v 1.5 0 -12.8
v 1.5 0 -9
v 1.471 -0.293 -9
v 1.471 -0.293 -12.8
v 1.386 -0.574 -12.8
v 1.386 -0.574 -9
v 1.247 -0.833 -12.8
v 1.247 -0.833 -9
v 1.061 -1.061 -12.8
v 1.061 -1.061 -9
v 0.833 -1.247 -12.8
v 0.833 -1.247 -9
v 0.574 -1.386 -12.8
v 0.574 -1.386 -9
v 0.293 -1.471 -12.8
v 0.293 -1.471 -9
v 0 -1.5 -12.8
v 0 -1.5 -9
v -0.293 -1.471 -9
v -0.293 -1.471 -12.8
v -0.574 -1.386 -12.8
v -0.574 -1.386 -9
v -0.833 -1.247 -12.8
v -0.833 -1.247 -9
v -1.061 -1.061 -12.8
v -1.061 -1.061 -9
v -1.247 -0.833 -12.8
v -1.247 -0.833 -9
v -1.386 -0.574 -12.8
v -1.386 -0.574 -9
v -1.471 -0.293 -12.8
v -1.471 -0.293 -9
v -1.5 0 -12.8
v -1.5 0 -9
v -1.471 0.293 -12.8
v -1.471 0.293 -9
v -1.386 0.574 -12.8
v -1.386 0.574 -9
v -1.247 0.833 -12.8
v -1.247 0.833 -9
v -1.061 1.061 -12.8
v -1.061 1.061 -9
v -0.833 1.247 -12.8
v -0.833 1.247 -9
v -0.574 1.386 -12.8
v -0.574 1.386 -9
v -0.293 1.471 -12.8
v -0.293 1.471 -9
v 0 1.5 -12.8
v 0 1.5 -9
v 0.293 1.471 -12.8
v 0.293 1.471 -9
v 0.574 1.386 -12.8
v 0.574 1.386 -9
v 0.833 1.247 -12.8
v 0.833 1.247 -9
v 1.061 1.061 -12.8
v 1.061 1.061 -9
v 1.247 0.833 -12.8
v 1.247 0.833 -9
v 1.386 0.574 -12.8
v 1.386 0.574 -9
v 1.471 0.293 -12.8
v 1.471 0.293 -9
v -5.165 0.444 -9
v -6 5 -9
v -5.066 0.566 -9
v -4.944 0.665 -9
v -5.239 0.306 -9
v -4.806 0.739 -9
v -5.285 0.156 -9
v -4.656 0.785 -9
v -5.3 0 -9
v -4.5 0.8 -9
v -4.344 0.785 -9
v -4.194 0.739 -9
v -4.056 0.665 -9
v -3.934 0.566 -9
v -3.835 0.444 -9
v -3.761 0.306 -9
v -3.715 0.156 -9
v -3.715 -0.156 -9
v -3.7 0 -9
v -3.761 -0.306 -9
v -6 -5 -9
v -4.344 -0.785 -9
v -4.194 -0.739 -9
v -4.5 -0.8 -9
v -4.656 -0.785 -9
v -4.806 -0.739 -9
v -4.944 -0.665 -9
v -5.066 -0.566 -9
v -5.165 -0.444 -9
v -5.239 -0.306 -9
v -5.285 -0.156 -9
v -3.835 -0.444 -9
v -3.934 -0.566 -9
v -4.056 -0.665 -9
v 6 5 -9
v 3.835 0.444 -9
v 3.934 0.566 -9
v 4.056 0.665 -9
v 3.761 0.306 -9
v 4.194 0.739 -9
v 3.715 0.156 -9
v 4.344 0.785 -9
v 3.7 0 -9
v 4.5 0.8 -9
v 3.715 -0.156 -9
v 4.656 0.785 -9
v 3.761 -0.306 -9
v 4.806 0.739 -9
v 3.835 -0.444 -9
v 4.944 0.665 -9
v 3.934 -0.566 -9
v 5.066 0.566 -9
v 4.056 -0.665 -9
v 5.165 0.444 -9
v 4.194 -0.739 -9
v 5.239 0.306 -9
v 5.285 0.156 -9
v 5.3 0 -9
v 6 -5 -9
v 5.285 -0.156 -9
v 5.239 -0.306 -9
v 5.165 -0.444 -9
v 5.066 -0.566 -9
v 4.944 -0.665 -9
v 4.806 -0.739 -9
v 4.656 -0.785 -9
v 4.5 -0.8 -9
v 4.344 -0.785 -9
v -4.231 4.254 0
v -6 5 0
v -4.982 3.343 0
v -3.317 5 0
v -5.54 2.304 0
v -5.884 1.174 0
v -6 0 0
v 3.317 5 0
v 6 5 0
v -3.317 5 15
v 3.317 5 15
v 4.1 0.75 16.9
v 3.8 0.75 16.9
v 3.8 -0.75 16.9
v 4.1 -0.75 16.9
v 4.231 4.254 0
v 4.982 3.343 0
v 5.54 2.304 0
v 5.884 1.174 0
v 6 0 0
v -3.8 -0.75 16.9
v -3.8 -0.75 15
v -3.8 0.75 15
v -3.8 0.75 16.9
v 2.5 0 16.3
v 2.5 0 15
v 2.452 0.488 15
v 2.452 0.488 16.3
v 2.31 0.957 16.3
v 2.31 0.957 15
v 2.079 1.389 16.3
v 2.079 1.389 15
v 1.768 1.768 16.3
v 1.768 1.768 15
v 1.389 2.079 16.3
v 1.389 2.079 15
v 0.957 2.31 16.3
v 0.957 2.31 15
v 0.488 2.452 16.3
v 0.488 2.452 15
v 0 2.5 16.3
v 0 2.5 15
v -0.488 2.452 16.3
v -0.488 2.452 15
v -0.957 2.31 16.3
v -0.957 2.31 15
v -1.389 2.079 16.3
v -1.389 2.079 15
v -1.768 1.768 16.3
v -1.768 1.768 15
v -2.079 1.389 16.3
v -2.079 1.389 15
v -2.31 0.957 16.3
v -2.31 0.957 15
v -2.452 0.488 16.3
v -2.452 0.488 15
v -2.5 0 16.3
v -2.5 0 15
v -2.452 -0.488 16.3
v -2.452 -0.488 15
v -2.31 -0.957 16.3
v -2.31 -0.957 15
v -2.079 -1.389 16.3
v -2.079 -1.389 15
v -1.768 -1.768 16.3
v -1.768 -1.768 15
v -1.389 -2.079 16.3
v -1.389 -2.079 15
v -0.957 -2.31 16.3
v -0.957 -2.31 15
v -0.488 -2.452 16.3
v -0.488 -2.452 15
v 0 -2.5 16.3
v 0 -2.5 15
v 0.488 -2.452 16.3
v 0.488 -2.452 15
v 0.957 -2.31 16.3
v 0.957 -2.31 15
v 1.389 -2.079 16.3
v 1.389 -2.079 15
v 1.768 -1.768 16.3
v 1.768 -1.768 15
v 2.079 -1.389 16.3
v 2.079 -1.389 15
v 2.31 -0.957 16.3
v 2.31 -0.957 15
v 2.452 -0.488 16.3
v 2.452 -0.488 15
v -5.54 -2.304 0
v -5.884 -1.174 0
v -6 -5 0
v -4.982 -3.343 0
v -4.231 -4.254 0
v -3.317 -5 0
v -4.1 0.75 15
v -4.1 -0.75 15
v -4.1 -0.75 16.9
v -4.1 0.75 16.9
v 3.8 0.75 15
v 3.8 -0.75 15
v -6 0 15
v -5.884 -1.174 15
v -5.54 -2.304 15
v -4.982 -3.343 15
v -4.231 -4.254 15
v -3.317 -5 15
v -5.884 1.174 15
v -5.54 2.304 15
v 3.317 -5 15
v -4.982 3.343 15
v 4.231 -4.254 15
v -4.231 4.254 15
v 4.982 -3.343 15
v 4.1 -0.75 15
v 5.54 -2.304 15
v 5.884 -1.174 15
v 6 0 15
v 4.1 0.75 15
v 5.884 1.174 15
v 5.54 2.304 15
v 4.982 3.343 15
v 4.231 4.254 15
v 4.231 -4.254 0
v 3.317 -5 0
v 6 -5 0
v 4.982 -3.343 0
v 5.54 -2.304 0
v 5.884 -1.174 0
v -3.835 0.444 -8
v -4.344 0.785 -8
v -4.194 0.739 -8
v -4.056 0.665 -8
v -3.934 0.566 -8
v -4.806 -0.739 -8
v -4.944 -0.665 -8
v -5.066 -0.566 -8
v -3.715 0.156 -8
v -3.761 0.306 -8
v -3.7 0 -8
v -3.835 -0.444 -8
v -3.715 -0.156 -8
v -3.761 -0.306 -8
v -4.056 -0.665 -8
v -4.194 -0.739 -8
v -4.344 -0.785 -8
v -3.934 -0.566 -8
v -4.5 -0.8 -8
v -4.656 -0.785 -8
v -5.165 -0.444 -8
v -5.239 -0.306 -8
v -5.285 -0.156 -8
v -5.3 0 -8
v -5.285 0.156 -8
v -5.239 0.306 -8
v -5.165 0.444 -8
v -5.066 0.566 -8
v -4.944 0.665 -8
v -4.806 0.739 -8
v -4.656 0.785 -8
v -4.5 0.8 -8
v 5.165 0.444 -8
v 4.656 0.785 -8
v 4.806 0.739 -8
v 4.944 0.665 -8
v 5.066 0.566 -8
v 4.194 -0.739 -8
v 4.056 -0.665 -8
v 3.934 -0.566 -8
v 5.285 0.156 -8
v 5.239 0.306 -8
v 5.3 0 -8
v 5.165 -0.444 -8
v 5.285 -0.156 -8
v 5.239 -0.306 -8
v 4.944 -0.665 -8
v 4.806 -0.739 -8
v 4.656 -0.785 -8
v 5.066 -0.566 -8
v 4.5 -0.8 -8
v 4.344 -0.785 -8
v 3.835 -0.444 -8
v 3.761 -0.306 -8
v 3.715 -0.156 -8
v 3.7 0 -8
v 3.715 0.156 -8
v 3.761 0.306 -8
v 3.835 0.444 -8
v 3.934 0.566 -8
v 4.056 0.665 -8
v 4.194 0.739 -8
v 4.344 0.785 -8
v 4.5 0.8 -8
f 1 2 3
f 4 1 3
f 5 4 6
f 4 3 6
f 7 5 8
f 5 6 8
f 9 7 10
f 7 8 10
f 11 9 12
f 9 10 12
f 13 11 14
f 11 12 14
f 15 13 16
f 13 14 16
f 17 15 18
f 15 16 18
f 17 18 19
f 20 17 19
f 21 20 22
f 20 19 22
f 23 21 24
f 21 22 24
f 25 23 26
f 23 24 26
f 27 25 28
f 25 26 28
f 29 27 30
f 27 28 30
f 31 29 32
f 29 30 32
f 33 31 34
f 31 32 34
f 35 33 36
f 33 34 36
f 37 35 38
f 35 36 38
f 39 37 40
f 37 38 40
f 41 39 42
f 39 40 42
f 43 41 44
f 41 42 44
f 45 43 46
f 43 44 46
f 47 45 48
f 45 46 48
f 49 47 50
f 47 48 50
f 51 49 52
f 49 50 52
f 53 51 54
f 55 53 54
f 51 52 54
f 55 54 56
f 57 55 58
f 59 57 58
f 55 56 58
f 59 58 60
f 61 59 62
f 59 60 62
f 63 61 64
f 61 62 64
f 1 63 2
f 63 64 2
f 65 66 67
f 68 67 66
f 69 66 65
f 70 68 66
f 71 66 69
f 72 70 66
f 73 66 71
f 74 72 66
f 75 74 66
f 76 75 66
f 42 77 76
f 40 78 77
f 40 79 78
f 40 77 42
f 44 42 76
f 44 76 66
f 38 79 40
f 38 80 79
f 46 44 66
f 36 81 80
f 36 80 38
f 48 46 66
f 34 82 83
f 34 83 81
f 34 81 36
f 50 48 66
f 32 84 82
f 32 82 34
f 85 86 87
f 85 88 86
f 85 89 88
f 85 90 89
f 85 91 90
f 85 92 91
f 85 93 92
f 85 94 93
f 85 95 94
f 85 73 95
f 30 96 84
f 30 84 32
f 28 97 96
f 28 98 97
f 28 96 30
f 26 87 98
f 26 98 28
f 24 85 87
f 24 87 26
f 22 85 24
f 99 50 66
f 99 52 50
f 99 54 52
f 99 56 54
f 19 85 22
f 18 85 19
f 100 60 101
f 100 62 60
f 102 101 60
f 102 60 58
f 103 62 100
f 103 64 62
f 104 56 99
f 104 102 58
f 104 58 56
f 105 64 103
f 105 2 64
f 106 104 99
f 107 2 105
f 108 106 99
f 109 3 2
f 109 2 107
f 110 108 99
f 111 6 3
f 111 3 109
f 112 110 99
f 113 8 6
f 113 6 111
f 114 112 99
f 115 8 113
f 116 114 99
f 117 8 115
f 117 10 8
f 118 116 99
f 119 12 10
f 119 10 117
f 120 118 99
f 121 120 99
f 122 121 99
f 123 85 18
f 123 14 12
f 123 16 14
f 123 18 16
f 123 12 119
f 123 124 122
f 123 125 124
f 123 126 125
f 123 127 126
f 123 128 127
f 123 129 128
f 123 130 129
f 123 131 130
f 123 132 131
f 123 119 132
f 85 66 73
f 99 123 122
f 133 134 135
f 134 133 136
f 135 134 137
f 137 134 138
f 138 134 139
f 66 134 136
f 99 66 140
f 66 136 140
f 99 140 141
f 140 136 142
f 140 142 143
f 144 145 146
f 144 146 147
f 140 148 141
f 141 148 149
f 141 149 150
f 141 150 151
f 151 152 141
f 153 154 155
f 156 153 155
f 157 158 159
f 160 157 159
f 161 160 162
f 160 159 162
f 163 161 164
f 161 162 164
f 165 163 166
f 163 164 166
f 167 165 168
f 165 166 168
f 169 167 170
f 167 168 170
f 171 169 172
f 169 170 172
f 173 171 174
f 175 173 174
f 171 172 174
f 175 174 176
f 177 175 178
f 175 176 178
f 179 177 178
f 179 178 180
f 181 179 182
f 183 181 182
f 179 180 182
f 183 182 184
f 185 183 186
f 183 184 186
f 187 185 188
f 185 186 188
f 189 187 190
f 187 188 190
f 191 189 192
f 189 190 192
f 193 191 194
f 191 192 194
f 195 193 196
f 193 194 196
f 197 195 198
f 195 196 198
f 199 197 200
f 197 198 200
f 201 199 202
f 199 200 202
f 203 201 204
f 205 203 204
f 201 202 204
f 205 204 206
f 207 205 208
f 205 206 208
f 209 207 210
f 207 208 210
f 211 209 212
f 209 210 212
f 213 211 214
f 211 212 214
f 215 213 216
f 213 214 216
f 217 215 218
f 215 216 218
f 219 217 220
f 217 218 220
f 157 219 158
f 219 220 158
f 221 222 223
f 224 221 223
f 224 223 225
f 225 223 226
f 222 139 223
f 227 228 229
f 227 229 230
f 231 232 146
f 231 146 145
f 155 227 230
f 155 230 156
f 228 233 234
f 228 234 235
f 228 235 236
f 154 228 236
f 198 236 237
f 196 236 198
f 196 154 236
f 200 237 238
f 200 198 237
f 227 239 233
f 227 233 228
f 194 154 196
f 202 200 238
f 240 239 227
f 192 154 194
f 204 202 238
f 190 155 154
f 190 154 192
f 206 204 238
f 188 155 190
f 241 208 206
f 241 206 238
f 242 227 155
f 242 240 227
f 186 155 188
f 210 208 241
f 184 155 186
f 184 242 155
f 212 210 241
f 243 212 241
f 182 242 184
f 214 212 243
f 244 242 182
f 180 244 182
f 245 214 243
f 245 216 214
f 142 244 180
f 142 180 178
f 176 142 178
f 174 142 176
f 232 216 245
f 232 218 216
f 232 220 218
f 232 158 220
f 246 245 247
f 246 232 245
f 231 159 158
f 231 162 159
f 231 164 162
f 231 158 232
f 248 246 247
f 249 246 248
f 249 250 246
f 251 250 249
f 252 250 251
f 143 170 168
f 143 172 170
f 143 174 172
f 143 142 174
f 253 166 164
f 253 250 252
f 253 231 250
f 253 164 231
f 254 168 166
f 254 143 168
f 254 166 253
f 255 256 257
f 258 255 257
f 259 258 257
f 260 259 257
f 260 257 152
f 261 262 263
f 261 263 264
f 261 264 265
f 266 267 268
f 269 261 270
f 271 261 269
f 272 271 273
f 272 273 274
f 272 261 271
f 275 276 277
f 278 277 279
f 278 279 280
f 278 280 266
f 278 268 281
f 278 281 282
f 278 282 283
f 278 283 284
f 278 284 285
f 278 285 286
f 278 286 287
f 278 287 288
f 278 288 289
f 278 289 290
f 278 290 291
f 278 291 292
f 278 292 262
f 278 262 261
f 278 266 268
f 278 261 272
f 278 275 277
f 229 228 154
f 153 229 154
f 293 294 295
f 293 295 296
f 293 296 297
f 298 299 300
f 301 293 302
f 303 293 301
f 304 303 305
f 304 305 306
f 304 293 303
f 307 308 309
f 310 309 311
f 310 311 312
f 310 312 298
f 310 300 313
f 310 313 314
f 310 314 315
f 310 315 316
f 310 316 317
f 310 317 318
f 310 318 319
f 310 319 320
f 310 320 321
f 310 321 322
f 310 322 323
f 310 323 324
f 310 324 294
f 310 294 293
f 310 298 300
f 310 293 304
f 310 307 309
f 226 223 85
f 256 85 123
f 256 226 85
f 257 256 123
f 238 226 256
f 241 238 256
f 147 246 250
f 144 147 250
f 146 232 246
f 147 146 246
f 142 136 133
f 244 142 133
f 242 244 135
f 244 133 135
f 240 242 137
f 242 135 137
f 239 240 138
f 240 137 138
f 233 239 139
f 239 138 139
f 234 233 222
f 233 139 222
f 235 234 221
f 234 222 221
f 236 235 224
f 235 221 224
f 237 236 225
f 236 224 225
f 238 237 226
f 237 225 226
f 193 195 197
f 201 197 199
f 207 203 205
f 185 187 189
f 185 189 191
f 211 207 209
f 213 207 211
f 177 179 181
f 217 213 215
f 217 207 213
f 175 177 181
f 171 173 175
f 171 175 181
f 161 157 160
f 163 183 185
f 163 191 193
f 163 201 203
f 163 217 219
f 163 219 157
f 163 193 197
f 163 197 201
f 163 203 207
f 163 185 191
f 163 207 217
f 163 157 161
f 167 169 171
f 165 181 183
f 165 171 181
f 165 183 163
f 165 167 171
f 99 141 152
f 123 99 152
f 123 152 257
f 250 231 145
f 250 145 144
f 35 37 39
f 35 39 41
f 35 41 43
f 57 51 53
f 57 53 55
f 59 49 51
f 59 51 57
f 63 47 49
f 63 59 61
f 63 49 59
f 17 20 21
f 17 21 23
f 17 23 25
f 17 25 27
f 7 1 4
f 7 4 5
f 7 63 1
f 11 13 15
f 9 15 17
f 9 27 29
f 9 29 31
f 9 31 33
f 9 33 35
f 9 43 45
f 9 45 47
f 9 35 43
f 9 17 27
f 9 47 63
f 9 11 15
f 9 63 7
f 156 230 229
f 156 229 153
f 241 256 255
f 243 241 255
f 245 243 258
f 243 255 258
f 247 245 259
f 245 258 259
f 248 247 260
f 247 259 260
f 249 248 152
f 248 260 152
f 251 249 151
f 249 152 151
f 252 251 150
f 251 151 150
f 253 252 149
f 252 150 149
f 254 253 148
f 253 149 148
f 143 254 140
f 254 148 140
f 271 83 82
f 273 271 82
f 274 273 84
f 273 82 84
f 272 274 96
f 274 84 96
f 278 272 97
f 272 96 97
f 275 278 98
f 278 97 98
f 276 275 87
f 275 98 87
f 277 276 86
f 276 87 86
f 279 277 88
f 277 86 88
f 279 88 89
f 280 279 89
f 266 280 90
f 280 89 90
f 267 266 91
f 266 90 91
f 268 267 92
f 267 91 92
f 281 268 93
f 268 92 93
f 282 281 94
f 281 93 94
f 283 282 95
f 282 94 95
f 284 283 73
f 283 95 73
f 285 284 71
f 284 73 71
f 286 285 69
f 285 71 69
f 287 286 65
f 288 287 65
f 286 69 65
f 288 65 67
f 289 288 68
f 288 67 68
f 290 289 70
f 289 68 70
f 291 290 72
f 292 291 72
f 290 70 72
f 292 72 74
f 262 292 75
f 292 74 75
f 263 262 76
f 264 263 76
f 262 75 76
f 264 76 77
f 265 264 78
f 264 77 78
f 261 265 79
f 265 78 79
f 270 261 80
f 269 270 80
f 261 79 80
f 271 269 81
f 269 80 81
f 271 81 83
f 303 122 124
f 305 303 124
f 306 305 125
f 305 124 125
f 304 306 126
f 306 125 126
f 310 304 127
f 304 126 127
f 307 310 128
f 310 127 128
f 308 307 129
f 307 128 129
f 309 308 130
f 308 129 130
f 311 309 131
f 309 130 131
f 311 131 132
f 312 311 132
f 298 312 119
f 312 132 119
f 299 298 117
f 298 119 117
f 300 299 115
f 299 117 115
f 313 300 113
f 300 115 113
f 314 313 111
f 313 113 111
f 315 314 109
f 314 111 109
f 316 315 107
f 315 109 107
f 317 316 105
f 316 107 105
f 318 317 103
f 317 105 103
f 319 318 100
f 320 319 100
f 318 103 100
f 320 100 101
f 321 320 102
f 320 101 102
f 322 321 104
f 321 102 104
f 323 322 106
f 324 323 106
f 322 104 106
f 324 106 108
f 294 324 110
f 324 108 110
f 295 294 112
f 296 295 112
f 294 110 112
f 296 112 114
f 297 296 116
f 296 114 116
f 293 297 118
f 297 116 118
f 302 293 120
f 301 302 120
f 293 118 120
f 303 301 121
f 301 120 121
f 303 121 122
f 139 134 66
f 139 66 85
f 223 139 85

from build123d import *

# Parameters (mm, degrees)
F1_DEPTH  = 15
F2_W      = 12
F2_H      = 10
F3_DEPTH  = 9
F4_R      = 0.8
F5_DEPTH  = 1
F6_R      = 1.5
F7_DEPTH  = 3.8
F8_R      = 2.5
F9_DEPTH  = 1.3
F10_W     = 0.3
F10_H     = 1.5
F11_DEPTH = 1.9


with BuildPart() as f1:
    # F0 (on Top) → F1 (new body)
    with BuildSketch(Plane.XY):
        with BuildLine():
            Line((3.316625, 5), (-3.316625, 5))
            ThreePointArc((-3.316625, 5), (-6, 0), (-3.316625, -5))
            Line((-3.316625, -5), (3.316625, -5))
            ThreePointArc((3.316625, -5), (6, 0), (3.316625, 5))
        make_face()
    extrude(amount=F1_DEPTH)

    # F2 (on face) → F3 (join)
    with BuildSketch(Plane(origin=(0, 0, 0), x_dir=(1, 0, 0), z_dir=(0, 0, -1))):
        Rectangle(F2_W, F2_H)
    extrude(amount=F3_DEPTH)

    # F4 (on face) → F5 (cut)
    with BuildSketch(Plane(origin=(0, 0, -9), x_dir=(1, 0, 0), z_dir=(0, 0, -1))):
        with Locations((-4.5, 0)):
            Circle(F4_R)
        with Locations((4.5, 0)):
            Circle(F4_R)
    extrude(amount=-F5_DEPTH, mode=Mode.SUBTRACT)

    # F6 (on face) → F7 (join)
    with BuildSketch(Plane(origin=(0, 0, -9), x_dir=(1, 0, 0), z_dir=(0, 0, -1))):
        Circle(F6_R)
    extrude(amount=F7_DEPTH)

    # F8 (on face) → F9 (join)
    with BuildSketch(Plane.XY.offset(15)):
        Circle(F8_R)
    extrude(amount=F9_DEPTH)

    # F10 (on face) → F11 (join)
    with BuildSketch(Plane.XY.offset(15)):
        with Locations((3.95, 0)):
            Rectangle(F10_W, F10_H)
        with Locations((-3.95, 0)):
            Rectangle(F10_W, F10_H)
    extrude(amount=F11_DEPTH)


solid = f1.part
